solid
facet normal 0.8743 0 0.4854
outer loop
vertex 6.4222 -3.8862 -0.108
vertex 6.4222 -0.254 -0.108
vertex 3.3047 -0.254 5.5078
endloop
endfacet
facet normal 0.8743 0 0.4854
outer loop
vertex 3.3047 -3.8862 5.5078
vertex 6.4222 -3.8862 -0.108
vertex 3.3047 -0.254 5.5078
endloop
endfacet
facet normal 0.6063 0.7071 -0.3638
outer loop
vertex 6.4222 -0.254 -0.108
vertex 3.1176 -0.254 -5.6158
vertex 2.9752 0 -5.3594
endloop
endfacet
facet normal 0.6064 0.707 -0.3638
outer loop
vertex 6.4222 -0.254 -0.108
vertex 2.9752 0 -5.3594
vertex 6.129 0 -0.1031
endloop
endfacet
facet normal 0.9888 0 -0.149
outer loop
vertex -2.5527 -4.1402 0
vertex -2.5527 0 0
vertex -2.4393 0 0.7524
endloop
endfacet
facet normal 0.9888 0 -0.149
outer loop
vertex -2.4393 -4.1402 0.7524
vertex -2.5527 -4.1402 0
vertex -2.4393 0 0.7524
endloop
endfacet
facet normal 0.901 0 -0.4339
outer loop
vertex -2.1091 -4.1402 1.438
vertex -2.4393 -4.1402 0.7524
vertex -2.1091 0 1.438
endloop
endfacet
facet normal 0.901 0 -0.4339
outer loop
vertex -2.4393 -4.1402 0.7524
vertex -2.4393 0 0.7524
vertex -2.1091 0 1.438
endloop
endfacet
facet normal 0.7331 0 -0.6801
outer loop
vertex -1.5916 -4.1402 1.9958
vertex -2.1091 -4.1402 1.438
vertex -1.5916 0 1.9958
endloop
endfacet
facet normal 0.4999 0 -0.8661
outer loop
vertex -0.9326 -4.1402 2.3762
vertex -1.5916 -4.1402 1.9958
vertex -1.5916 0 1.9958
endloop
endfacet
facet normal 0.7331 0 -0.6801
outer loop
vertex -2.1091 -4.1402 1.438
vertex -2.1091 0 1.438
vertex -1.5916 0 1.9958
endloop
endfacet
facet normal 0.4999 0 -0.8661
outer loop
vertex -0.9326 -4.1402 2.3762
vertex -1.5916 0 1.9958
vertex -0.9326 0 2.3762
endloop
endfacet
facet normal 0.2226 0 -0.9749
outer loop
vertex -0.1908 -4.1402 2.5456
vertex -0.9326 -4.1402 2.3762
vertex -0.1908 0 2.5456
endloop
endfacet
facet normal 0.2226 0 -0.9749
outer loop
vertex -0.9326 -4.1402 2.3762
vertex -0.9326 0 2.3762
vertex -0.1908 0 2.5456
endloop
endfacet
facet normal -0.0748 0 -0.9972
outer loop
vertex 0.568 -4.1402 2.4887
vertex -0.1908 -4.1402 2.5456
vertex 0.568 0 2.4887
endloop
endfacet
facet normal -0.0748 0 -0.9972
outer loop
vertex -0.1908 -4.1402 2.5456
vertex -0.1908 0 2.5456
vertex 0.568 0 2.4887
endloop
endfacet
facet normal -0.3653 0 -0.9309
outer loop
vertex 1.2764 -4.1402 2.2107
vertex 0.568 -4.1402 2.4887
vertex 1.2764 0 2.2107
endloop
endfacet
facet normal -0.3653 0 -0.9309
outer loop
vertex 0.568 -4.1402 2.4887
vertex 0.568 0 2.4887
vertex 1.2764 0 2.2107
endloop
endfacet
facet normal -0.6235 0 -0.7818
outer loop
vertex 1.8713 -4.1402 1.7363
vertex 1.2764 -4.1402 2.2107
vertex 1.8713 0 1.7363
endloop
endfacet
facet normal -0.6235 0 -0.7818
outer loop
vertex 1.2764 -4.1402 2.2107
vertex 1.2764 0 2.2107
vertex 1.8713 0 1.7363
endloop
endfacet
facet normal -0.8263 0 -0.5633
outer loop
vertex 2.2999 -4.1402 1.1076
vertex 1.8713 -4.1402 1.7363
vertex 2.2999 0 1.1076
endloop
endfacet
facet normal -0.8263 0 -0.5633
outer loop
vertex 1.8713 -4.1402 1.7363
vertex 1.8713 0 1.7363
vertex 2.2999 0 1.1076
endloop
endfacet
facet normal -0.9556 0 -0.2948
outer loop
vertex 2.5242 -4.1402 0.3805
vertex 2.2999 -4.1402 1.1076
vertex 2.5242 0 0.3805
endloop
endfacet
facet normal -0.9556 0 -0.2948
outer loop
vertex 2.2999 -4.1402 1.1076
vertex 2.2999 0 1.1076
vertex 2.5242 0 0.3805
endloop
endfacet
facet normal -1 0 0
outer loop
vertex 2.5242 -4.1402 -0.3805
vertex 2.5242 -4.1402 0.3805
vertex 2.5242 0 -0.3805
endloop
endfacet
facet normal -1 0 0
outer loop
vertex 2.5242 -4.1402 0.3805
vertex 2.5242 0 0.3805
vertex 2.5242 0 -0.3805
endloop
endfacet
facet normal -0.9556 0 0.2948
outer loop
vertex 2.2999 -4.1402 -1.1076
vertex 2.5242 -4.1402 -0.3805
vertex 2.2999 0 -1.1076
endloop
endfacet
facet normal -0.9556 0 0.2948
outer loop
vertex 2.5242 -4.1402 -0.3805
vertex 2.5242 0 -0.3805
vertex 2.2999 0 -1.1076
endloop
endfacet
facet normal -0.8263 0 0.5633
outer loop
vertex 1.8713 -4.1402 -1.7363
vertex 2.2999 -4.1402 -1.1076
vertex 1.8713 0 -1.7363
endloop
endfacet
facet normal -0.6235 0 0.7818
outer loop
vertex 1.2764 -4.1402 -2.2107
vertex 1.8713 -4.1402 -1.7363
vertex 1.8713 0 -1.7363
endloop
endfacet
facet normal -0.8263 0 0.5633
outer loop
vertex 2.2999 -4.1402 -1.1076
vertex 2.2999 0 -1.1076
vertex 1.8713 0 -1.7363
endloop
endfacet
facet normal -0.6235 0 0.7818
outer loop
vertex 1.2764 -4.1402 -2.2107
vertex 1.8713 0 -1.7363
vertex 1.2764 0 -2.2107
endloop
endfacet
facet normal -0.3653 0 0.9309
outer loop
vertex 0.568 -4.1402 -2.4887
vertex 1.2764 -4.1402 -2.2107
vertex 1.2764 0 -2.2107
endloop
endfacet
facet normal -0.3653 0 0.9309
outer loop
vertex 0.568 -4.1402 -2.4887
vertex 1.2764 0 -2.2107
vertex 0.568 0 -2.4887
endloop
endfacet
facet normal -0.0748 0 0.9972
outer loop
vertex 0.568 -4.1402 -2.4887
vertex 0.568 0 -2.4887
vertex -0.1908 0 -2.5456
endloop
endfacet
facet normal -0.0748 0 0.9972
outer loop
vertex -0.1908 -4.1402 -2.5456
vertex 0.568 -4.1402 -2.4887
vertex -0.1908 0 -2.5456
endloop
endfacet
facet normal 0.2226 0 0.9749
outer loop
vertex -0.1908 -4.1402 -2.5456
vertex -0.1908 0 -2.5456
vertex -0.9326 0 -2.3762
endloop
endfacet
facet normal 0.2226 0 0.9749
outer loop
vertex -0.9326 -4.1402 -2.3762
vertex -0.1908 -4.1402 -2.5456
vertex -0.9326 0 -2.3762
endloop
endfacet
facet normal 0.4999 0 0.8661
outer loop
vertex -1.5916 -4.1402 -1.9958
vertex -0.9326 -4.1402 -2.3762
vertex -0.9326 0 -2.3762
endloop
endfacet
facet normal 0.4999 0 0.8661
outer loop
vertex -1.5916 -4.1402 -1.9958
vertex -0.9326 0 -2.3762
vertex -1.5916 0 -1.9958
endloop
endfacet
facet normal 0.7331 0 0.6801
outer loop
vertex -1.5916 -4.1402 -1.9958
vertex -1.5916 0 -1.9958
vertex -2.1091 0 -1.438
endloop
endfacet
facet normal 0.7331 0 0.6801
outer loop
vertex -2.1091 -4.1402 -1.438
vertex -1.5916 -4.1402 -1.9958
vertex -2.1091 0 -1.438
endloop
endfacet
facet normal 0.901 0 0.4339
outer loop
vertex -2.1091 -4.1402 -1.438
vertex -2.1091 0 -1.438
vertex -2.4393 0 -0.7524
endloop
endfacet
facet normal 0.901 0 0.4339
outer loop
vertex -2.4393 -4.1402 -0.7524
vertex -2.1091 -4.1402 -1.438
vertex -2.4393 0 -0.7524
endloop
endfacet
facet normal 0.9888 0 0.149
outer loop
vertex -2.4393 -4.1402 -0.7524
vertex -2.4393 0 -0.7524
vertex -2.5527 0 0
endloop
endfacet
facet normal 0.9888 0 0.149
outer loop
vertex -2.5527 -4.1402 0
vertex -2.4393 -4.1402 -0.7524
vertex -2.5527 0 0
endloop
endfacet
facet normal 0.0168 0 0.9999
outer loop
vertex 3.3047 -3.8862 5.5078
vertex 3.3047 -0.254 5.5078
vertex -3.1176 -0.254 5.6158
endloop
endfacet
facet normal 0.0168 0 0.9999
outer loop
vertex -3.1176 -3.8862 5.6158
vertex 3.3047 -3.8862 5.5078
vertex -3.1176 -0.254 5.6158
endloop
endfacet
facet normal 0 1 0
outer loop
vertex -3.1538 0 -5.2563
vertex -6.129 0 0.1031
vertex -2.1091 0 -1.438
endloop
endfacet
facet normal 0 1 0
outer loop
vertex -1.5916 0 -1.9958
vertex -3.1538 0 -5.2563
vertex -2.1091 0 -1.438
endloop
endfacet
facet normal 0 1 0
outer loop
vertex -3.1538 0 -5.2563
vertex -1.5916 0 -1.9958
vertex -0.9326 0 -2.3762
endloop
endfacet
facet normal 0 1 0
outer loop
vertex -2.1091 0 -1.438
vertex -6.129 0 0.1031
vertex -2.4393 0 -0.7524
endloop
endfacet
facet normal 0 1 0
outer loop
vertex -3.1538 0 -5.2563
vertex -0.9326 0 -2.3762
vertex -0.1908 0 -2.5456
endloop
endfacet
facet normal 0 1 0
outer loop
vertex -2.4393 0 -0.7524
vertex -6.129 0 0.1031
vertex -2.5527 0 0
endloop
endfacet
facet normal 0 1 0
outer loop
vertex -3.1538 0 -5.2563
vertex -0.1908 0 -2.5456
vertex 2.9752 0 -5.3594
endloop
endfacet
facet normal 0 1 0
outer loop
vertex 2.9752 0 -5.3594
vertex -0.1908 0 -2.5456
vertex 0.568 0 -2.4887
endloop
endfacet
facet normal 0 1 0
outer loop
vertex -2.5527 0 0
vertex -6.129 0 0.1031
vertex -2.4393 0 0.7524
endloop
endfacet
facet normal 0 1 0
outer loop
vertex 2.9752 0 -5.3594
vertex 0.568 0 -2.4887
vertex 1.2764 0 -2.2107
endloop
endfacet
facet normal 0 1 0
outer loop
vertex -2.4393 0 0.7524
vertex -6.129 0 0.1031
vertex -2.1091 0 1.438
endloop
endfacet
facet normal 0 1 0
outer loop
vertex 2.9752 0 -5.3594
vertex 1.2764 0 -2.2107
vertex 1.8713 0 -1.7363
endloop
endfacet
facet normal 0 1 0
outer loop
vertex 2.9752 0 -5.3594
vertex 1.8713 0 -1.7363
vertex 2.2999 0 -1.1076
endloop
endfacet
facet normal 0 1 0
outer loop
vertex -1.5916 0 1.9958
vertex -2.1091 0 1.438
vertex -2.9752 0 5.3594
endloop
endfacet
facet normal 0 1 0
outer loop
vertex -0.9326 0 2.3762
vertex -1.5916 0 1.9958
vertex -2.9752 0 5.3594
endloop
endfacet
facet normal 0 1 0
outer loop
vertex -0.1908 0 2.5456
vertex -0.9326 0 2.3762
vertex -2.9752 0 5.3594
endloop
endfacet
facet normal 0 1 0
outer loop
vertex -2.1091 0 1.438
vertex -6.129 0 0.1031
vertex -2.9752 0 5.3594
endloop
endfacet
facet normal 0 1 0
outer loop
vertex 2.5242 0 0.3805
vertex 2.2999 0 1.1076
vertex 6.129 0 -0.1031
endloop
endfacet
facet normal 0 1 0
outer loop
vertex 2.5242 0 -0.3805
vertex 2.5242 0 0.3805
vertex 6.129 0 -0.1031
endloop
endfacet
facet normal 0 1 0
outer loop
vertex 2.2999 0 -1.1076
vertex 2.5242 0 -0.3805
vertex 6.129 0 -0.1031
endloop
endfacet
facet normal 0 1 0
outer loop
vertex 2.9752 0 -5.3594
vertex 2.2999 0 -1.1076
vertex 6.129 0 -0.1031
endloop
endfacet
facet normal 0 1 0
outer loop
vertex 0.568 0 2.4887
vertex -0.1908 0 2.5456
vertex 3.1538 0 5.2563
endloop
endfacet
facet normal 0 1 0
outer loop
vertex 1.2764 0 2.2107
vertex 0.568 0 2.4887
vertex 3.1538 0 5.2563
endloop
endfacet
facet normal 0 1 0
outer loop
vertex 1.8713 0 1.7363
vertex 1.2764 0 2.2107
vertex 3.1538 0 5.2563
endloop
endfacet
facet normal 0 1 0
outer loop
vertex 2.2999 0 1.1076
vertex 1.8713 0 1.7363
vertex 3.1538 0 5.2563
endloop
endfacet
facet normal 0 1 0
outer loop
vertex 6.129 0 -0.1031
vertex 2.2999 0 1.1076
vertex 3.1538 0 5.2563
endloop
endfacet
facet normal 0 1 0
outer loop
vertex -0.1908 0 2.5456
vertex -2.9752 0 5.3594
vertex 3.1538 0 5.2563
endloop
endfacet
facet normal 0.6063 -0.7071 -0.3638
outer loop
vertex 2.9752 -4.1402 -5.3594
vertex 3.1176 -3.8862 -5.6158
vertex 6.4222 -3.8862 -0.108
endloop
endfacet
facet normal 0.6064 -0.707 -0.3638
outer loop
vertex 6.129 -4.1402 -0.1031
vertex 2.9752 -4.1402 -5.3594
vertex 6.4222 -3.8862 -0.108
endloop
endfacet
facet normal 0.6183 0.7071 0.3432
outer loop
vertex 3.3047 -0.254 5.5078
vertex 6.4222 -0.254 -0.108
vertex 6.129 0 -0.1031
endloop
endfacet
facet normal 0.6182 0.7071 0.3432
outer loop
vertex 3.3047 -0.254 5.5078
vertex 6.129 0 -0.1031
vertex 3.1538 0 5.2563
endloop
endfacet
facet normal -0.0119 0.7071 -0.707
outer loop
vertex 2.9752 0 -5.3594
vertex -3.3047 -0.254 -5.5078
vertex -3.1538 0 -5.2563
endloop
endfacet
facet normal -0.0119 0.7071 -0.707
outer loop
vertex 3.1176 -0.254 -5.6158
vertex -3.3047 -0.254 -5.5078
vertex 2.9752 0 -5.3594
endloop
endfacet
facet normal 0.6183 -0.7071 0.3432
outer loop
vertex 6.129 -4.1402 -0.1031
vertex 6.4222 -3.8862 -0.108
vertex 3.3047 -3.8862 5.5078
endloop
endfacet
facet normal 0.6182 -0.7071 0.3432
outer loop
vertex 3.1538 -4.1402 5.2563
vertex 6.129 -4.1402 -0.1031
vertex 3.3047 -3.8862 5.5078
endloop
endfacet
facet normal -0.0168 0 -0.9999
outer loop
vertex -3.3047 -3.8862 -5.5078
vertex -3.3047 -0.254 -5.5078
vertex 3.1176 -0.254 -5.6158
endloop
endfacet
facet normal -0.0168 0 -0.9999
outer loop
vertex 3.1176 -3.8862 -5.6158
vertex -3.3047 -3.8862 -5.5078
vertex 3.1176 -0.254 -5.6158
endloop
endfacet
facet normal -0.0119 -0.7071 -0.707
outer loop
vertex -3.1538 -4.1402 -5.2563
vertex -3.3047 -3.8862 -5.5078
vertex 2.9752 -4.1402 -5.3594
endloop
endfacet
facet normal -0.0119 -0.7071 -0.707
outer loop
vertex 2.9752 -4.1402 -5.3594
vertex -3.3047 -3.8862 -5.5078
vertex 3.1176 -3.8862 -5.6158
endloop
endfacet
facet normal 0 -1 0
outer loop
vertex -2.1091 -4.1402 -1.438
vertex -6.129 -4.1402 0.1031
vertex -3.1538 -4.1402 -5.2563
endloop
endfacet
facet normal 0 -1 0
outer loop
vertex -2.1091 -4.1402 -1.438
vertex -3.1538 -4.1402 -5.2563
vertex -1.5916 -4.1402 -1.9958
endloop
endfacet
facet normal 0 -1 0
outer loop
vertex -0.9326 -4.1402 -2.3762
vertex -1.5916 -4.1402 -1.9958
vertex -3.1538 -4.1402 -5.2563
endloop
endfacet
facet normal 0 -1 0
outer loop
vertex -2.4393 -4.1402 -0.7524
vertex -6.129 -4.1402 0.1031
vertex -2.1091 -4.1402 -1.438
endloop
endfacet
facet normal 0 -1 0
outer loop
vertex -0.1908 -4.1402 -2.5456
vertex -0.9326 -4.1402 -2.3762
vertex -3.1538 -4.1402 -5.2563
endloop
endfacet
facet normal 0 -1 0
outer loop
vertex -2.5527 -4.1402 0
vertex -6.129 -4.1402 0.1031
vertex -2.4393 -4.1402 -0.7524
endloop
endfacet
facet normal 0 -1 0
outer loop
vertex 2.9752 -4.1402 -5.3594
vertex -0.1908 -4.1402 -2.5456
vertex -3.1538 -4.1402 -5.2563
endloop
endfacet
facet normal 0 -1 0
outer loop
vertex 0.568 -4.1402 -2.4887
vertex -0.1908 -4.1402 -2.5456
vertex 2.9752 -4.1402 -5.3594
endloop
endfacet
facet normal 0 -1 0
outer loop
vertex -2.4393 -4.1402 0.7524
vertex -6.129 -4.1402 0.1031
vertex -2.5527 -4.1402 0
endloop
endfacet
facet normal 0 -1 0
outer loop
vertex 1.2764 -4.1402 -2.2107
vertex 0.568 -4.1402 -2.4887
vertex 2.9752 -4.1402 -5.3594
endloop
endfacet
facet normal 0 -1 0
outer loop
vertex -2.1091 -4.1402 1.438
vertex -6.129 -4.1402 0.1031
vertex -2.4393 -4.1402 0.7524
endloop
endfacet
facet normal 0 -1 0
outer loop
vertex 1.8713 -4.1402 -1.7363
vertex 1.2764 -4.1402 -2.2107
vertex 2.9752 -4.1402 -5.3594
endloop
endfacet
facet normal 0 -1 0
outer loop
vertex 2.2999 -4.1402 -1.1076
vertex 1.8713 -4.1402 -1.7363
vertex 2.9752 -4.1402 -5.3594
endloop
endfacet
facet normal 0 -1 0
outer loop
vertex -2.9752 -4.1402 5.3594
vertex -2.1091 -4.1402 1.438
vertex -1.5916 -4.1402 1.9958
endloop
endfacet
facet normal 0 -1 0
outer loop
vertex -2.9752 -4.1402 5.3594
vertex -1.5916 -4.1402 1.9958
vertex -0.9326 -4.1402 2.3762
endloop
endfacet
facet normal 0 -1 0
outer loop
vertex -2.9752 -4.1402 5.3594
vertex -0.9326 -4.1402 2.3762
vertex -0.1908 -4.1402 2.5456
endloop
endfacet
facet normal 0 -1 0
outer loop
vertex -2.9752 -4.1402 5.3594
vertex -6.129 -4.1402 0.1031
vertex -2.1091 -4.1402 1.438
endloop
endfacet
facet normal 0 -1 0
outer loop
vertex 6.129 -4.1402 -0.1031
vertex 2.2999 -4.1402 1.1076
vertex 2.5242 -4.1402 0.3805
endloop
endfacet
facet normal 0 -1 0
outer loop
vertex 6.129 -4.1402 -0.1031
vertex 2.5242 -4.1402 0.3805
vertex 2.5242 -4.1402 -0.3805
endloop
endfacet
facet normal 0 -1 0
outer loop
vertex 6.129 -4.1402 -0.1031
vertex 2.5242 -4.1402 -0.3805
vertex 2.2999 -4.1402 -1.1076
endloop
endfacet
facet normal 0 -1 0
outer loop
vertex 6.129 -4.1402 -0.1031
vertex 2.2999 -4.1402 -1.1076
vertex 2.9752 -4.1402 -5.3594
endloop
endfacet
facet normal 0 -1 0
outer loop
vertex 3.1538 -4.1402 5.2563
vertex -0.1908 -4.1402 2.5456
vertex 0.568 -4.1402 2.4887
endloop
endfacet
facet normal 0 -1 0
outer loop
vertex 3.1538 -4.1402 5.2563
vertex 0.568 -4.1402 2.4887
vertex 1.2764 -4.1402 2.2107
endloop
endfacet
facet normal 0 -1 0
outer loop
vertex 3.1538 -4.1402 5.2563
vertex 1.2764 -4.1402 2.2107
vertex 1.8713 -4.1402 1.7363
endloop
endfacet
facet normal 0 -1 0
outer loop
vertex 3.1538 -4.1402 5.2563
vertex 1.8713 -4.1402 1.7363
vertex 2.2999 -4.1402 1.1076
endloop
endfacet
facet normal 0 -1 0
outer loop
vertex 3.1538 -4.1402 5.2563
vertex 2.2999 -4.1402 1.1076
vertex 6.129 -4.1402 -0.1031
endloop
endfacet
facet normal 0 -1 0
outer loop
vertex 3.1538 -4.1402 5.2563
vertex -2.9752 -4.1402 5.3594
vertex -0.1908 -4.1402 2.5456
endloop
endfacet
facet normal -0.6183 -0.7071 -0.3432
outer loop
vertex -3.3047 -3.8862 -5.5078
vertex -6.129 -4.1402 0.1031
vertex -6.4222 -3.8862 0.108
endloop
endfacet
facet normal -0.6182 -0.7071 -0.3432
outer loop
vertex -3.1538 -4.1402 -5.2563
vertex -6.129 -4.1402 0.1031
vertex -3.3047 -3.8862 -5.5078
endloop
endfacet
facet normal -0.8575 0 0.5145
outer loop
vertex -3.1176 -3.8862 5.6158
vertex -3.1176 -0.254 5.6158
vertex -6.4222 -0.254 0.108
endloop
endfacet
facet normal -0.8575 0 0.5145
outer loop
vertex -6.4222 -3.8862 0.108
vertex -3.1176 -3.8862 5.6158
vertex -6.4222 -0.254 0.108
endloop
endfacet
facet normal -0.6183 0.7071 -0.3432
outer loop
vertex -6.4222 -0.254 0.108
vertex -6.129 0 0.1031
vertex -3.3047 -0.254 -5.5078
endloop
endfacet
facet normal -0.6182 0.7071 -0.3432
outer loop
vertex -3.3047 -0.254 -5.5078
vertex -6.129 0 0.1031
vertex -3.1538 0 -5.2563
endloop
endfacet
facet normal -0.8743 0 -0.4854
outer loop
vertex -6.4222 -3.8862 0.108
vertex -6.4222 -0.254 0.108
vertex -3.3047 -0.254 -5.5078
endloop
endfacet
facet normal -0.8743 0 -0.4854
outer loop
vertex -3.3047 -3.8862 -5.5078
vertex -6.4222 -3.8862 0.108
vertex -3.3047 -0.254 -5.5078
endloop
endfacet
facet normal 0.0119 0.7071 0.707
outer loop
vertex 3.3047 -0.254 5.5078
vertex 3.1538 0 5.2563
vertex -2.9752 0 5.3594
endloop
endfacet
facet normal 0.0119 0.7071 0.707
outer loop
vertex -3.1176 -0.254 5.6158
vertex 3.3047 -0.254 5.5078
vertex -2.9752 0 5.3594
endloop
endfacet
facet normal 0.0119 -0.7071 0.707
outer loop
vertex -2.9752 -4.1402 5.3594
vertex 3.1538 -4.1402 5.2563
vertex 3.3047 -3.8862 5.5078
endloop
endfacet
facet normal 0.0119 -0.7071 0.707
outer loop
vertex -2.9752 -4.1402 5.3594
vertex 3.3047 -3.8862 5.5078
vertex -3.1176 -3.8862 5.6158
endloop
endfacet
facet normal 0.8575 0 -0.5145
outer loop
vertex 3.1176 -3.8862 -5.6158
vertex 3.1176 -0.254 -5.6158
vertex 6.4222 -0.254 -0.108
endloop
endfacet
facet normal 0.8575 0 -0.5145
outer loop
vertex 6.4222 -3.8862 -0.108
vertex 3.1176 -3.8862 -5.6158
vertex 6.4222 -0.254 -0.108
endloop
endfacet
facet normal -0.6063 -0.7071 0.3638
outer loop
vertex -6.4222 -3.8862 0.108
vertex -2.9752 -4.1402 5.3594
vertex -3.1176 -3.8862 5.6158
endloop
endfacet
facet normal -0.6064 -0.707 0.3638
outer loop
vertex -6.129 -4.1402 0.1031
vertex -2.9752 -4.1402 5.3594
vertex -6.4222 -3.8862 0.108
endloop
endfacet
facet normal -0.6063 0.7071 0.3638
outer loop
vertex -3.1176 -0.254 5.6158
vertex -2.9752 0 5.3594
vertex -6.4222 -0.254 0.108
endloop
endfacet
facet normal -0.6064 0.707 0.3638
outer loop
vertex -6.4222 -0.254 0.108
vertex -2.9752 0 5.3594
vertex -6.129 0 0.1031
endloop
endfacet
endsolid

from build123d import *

# Parameters (mm, degrees)
F1_DEPTH = 4.1402
F3_D     = 5.1054
F4_SIZE  = 0.254


with BuildPart() as f1:
    # F0 (on Front) → F1 (new body)
    with BuildSketch(Plane.XZ):
        Polygon((-3.1175517919, 5.6158314171), (-6.4222285665, 0.1080366591), (-3.3046767746, -5.5077947579), (3.1175517919, -5.6158314171), (6.4222285665, -0.1080366591), (3.3046767746, 5.5077947579), align=None)
    extrude(amount=F1_DEPTH)

    # F3 (through all)
    with Locations(Plane.XZ.offset(4.1402)):
        with Locations((0, 0)):
            Hole(F3_D / 2)

    # F4
    f4_edges = [f1.edges().sort_by_distance(p)[0] for p in [
        (-4.76989, -4.1402, 2.861934),
        (0.093562, -4.1402, 5.561813),
        (4.863453, -4.1402, 2.699879),
        (4.76989, -4.1402, -2.861934),
        (-0.093562, -4.1402, -5.561813),
        (-4.863453, -4.1402, -2.699879),
        (-4.863453, 0, -2.699879),
        (-4.76989, 0, 2.861934),
        (0.093562, 0, 5.561813),
        (4.863453, 0, 2.699879),
        (4.76989, 0, -2.861934),
        (-0.093562, 0, -5.561813),
    ]]
    chamfer(f4_edges, length=F4_SIZE)


solid = f1.part
